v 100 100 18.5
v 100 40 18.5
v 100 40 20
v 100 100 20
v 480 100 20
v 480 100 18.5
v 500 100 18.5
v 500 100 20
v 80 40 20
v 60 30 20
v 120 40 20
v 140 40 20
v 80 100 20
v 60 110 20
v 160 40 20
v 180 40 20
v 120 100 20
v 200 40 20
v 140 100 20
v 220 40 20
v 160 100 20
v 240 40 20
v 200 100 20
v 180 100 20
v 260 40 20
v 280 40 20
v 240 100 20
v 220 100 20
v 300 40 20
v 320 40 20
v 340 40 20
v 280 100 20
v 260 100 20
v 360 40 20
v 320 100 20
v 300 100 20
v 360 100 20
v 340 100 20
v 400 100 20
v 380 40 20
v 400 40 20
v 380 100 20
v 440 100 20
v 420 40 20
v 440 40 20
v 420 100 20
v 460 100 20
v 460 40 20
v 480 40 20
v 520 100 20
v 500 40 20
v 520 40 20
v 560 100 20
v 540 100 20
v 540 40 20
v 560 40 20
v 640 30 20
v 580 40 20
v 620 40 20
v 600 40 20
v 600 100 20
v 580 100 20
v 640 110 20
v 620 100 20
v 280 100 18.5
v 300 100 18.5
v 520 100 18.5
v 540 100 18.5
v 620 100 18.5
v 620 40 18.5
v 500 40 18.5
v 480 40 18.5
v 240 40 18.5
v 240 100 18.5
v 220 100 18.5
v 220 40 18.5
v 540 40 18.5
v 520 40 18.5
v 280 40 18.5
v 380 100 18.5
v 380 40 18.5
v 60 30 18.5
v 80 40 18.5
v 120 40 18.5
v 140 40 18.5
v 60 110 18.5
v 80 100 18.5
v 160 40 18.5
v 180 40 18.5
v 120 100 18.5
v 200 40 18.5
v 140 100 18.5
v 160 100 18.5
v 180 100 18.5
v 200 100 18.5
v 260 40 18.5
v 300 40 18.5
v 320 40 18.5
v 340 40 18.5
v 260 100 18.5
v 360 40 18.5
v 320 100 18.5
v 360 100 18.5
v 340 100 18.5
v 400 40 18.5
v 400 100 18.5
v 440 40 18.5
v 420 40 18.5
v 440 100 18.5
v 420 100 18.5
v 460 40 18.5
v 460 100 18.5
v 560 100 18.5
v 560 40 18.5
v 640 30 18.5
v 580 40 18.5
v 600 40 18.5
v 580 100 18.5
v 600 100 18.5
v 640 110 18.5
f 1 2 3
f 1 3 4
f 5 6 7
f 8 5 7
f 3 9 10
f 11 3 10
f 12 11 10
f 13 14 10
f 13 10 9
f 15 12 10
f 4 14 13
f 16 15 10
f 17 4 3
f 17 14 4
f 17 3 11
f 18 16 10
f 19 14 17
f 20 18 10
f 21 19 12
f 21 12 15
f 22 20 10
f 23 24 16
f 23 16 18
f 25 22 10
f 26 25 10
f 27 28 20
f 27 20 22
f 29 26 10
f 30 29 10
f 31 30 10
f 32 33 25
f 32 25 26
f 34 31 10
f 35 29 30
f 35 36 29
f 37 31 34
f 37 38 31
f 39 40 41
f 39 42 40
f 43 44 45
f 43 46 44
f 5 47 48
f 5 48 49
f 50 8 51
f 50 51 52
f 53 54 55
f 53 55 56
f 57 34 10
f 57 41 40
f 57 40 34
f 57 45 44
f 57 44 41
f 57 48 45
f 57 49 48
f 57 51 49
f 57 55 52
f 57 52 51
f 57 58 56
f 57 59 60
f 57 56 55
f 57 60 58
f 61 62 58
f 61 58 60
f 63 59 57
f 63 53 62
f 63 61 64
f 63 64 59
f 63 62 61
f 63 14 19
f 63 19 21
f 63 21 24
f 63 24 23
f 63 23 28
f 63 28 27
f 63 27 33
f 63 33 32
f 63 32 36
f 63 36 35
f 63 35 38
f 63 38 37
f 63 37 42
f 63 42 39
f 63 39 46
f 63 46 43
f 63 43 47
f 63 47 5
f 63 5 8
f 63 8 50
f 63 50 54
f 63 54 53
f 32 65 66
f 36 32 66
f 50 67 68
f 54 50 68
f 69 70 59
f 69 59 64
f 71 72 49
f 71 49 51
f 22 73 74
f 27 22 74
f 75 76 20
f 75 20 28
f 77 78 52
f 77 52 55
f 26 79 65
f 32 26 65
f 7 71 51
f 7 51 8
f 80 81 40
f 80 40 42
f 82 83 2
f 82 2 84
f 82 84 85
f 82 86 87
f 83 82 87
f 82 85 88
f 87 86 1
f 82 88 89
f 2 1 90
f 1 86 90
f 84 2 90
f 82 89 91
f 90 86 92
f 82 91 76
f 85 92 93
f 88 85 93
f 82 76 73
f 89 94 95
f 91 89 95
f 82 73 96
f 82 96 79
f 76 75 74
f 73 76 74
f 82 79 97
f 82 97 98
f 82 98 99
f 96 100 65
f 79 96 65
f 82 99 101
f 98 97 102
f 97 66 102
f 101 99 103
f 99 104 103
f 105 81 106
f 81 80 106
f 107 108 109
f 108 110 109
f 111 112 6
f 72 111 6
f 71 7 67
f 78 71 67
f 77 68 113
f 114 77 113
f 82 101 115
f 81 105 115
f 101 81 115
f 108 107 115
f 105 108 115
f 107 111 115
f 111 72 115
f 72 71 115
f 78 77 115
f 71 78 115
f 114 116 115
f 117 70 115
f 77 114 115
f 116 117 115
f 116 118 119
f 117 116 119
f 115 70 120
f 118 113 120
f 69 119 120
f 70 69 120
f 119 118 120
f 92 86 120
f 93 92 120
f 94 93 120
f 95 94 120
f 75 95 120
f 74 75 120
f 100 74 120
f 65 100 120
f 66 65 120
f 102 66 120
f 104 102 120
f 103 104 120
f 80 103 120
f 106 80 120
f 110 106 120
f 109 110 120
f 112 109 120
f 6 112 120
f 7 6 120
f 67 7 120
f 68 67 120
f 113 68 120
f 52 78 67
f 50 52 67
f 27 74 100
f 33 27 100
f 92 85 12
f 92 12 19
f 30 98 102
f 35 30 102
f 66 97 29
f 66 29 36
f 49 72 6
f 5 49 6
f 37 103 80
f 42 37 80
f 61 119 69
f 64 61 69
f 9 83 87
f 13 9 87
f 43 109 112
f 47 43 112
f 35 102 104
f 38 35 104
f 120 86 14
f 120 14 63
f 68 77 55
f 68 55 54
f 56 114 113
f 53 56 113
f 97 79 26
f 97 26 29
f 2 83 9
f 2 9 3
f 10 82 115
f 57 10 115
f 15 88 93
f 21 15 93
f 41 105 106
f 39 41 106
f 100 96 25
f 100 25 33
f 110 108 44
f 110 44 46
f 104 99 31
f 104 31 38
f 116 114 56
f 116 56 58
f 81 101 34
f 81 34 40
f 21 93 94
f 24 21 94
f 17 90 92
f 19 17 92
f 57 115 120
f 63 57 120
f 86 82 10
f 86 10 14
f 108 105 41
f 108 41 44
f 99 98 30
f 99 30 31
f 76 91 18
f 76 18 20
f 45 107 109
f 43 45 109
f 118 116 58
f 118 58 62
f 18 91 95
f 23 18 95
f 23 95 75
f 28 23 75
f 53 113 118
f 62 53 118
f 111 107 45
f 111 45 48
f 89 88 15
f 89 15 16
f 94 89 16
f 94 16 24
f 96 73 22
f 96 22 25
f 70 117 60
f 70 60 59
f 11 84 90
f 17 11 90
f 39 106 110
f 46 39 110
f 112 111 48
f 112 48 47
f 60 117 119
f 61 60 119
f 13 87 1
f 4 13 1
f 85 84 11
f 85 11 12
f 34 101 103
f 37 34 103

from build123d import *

# Parameters (mm, degrees)
PACK_PLINT_IZGARA_PANELI_1_START  = 18.5
SKETCH1_W                         = 580
SKETCH1_H                         = 80
PACK_PLINT_IZGARA_PANELI_1_DEPTH  = 1.5
PACK_PLINT_IZGARA_PANELI_2_START  = 17
SKETCH2_W                         = 20
SKETCH2_H                         = 60
PACK_PLINT_IZGARA_PANELI_2_DEPTH  = 4
PACK_PLINT_IZGARA_PANELI_3_START  = 17
SKETCH3_W                         = 20
SKETCH3_H                         = 60
PACK_PLINT_IZGARA_PANELI_3_DEPTH  = 4
PACK_PLINT_IZGARA_PANELI_4_START  = 17
SKETCH4_W                         = 20
SKETCH4_H                         = 60
PACK_PLINT_IZGARA_PANELI_4_DEPTH  = 4
PACK_PLINT_IZGARA_PANELI_5_START  = 17
SKETCH5_W                         = 20
SKETCH5_H                         = 60
PACK_PLINT_IZGARA_PANELI_5_DEPTH  = 4
PACK_PLINT_IZGARA_PANELI_6_START  = 17
SKETCH6_W                         = 20
SKETCH6_H                         = 60
PACK_PLINT_IZGARA_PANELI_6_DEPTH  = 4
PACK_PLINT_IZGARA_PANELI_7_START  = 17
SKETCH7_W                         = 20
SKETCH7_H                         = 60
PACK_PLINT_IZGARA_PANELI_7_DEPTH  = 4
PACK_PLINT_IZGARA_PANELI_8_START  = 17
SKETCH8_W                         = 20
SKETCH8_H                         = 60
PACK_PLINT_IZGARA_PANELI_8_DEPTH  = 4
PACK_PLINT_IZGARA_PANELI_9_START  = 17
SKETCH9_W                         = 20
SKETCH9_H                         = 60
PACK_PLINT_IZGARA_PANELI_9_DEPTH  = 4
PACK_PLINT_IZGARA_PANELI_10_START = 17
SKETCH10_W                        = 20
SKETCH10_H                        = 60
PACK_PLINT_IZGARA_PANELI_10_DEPTH = 4
PACK_PLINT_IZGARA_PANELI_11_START = 17
SKETCH11_W                        = 20
SKETCH11_H                        = 60
PACK_PLINT_IZGARA_PANELI_11_DEPTH = 4
PACK_PLINT_IZGARA_PANELI_12_START = 17
SKETCH12_W                        = 20
SKETCH12_H                        = 60
PACK_PLINT_IZGARA_PANELI_12_DEPTH = 4
PACK_PLINT_IZGARA_PANELI_13_START = 17
SKETCH13_W                        = 20
SKETCH13_H                        = 60
PACK_PLINT_IZGARA_PANELI_13_DEPTH = 4
PACK_PLINT_IZGARA_PANELI_14_START = 17
SKETCH14_W                        = 20
SKETCH14_H                        = 60
PACK_PLINT_IZGARA_PANELI_14_DEPTH = 4
PACK_PLINT_IZGARA_PANELI_15_START = 17
SKETCH15_W                        = 20
SKETCH15_H                        = 60
PACK_PLINT_IZGARA_PANELI_15_DEPTH = 4


with BuildPart() as part:
    # Sketch1 → PACK_plint_izgara_paneli_1 (new body)
    with BuildSketch(Plane.XY.offset(PACK_PLINT_IZGARA_PANELI_1_START)):
        with Locations((350, 70)):
            Rectangle(SKETCH1_W, SKETCH1_H)
    extrude(amount=PACK_PLINT_IZGARA_PANELI_1_DEPTH)

    # Sketch2 → PACK_plint_izgara_paneli_2 (cut)
    with BuildSketch(Plane.XY.offset(PACK_PLINT_IZGARA_PANELI_2_START)):
        with Locations((90, 70)):
            Rectangle(SKETCH2_W, SKETCH2_H)
    extrude(amount=PACK_PLINT_IZGARA_PANELI_2_DEPTH, mode=Mode.SUBTRACT)

    # Sketch3 → PACK_plint_izgara_paneli_3 (cut)
    with BuildSketch(Plane.XY.offset(PACK_PLINT_IZGARA_PANELI_3_START)):
        with Locations((130, 70)):
            Rectangle(SKETCH3_W, SKETCH3_H)
    extrude(amount=PACK_PLINT_IZGARA_PANELI_3_DEPTH, mode=Mode.SUBTRACT)

    # Sketch4 → PACK_plint_izgara_paneli_4 (cut)
    with BuildSketch(Plane.XY.offset(PACK_PLINT_IZGARA_PANELI_4_START)):
        with Locations((170, 70)):
            Rectangle(SKETCH4_W, SKETCH4_H)
    extrude(amount=PACK_PLINT_IZGARA_PANELI_4_DEPTH, mode=Mode.SUBTRACT)

    # Sketch5 → PACK_plint_izgara_paneli_5 (cut)
    with BuildSketch(Plane.XY.offset(PACK_PLINT_IZGARA_PANELI_5_START)):
        with Locations((210, 70)):
            Rectangle(SKETCH5_W, SKETCH5_H)
    extrude(amount=PACK_PLINT_IZGARA_PANELI_5_DEPTH, mode=Mode.SUBTRACT)

    # Sketch6 → PACK_plint_izgara_paneli_6 (cut)
    with BuildSketch(Plane.XY.offset(PACK_PLINT_IZGARA_PANELI_6_START)):
        with Locations((250, 70)):
            Rectangle(SKETCH6_W, SKETCH6_H)
    extrude(amount=PACK_PLINT_IZGARA_PANELI_6_DEPTH, mode=Mode.SUBTRACT)

    # Sketch7 → PACK_plint_izgara_paneli_7 (cut)
    with BuildSketch(Plane.XY.offset(PACK_PLINT_IZGARA_PANELI_7_START)):
        with Locations((290, 70)):
            Rectangle(SKETCH7_W, SKETCH7_H)
    extrude(amount=PACK_PLINT_IZGARA_PANELI_7_DEPTH, mode=Mode.SUBTRACT)

    # Sketch8 → PACK_plint_izgara_paneli_8 (cut)
    with BuildSketch(Plane.XY.offset(PACK_PLINT_IZGARA_PANELI_8_START)):
        with Locations((330, 70)):
            Rectangle(SKETCH8_W, SKETCH8_H)
    extrude(amount=PACK_PLINT_IZGARA_PANELI_8_DEPTH, mode=Mode.SUBTRACT)

    # Sketch9 → PACK_plint_izgara_paneli_9 (cut)
    with BuildSketch(Plane.XY.offset(PACK_PLINT_IZGARA_PANELI_9_START)):
        with Locations((370, 70)):
            Rectangle(SKETCH9_W, SKETCH9_H)
    extrude(amount=PACK_PLINT_IZGARA_PANELI_9_DEPTH, mode=Mode.SUBTRACT)

    # Sketch10 → PACK_plint_izgara_paneli_10 (cut)
    with BuildSketch(Plane.XY.offset(PACK_PLINT_IZGARA_PANELI_10_START)):
        with Locations((410, 70)):
            Rectangle(SKETCH10_W, SKETCH10_H)
    extrude(amount=PACK_PLINT_IZGARA_PANELI_10_DEPTH, mode=Mode.SUBTRACT)

    # Sketch11 → PACK_plint_izgara_paneli_11 (cut)
    with BuildSketch(Plane.XY.offset(PACK_PLINT_IZGARA_PANELI_11_START)):
        with Locations((450, 70)):
            Rectangle(SKETCH11_W, SKETCH11_H)
    extrude(amount=PACK_PLINT_IZGARA_PANELI_11_DEPTH, mode=Mode.SUBTRACT)

    # Sketch12 → PACK_plint_izgara_paneli_12 (cut)
    with BuildSketch(Plane.XY.offset(PACK_PLINT_IZGARA_PANELI_12_START)):
        with Locations((490, 70)):
            Rectangle(SKETCH12_W, SKETCH12_H)
    extrude(amount=PACK_PLINT_IZGARA_PANELI_12_DEPTH, mode=Mode.SUBTRACT)

    # Sketch13 → PACK_plint_izgara_paneli_13 (cut)
    with BuildSketch(Plane.XY.offset(PACK_PLINT_IZGARA_PANELI_13_START)):
        with Locations((530, 70)):
            Rectangle(SKETCH13_W, SKETCH13_H)
    extrude(amount=PACK_PLINT_IZGARA_PANELI_13_DEPTH, mode=Mode.SUBTRACT)

    # Sketch14 → PACK_plint_izgara_paneli_14 (cut)
    with BuildSketch(Plane.XY.offset(PACK_PLINT_IZGARA_PANELI_14_START)):
        with Locations((570, 70)):
            Rectangle(SKETCH14_W, SKETCH14_H)
    extrude(amount=PACK_PLINT_IZGARA_PANELI_14_DEPTH, mode=Mode.SUBTRACT)

    # Sketch15 → PACK_plint_izgara_paneli_15 (cut)
    with BuildSketch(Plane.XY.offset(PACK_PLINT_IZGARA_PANELI_15_START)):
        with Locations((610, 70)):
            Rectangle(SKETCH15_W, SKETCH15_H)
    extrude(amount=PACK_PLINT_IZGARA_PANELI_15_DEPTH, mode=Mode.SUBTRACT)


solid = part.part
